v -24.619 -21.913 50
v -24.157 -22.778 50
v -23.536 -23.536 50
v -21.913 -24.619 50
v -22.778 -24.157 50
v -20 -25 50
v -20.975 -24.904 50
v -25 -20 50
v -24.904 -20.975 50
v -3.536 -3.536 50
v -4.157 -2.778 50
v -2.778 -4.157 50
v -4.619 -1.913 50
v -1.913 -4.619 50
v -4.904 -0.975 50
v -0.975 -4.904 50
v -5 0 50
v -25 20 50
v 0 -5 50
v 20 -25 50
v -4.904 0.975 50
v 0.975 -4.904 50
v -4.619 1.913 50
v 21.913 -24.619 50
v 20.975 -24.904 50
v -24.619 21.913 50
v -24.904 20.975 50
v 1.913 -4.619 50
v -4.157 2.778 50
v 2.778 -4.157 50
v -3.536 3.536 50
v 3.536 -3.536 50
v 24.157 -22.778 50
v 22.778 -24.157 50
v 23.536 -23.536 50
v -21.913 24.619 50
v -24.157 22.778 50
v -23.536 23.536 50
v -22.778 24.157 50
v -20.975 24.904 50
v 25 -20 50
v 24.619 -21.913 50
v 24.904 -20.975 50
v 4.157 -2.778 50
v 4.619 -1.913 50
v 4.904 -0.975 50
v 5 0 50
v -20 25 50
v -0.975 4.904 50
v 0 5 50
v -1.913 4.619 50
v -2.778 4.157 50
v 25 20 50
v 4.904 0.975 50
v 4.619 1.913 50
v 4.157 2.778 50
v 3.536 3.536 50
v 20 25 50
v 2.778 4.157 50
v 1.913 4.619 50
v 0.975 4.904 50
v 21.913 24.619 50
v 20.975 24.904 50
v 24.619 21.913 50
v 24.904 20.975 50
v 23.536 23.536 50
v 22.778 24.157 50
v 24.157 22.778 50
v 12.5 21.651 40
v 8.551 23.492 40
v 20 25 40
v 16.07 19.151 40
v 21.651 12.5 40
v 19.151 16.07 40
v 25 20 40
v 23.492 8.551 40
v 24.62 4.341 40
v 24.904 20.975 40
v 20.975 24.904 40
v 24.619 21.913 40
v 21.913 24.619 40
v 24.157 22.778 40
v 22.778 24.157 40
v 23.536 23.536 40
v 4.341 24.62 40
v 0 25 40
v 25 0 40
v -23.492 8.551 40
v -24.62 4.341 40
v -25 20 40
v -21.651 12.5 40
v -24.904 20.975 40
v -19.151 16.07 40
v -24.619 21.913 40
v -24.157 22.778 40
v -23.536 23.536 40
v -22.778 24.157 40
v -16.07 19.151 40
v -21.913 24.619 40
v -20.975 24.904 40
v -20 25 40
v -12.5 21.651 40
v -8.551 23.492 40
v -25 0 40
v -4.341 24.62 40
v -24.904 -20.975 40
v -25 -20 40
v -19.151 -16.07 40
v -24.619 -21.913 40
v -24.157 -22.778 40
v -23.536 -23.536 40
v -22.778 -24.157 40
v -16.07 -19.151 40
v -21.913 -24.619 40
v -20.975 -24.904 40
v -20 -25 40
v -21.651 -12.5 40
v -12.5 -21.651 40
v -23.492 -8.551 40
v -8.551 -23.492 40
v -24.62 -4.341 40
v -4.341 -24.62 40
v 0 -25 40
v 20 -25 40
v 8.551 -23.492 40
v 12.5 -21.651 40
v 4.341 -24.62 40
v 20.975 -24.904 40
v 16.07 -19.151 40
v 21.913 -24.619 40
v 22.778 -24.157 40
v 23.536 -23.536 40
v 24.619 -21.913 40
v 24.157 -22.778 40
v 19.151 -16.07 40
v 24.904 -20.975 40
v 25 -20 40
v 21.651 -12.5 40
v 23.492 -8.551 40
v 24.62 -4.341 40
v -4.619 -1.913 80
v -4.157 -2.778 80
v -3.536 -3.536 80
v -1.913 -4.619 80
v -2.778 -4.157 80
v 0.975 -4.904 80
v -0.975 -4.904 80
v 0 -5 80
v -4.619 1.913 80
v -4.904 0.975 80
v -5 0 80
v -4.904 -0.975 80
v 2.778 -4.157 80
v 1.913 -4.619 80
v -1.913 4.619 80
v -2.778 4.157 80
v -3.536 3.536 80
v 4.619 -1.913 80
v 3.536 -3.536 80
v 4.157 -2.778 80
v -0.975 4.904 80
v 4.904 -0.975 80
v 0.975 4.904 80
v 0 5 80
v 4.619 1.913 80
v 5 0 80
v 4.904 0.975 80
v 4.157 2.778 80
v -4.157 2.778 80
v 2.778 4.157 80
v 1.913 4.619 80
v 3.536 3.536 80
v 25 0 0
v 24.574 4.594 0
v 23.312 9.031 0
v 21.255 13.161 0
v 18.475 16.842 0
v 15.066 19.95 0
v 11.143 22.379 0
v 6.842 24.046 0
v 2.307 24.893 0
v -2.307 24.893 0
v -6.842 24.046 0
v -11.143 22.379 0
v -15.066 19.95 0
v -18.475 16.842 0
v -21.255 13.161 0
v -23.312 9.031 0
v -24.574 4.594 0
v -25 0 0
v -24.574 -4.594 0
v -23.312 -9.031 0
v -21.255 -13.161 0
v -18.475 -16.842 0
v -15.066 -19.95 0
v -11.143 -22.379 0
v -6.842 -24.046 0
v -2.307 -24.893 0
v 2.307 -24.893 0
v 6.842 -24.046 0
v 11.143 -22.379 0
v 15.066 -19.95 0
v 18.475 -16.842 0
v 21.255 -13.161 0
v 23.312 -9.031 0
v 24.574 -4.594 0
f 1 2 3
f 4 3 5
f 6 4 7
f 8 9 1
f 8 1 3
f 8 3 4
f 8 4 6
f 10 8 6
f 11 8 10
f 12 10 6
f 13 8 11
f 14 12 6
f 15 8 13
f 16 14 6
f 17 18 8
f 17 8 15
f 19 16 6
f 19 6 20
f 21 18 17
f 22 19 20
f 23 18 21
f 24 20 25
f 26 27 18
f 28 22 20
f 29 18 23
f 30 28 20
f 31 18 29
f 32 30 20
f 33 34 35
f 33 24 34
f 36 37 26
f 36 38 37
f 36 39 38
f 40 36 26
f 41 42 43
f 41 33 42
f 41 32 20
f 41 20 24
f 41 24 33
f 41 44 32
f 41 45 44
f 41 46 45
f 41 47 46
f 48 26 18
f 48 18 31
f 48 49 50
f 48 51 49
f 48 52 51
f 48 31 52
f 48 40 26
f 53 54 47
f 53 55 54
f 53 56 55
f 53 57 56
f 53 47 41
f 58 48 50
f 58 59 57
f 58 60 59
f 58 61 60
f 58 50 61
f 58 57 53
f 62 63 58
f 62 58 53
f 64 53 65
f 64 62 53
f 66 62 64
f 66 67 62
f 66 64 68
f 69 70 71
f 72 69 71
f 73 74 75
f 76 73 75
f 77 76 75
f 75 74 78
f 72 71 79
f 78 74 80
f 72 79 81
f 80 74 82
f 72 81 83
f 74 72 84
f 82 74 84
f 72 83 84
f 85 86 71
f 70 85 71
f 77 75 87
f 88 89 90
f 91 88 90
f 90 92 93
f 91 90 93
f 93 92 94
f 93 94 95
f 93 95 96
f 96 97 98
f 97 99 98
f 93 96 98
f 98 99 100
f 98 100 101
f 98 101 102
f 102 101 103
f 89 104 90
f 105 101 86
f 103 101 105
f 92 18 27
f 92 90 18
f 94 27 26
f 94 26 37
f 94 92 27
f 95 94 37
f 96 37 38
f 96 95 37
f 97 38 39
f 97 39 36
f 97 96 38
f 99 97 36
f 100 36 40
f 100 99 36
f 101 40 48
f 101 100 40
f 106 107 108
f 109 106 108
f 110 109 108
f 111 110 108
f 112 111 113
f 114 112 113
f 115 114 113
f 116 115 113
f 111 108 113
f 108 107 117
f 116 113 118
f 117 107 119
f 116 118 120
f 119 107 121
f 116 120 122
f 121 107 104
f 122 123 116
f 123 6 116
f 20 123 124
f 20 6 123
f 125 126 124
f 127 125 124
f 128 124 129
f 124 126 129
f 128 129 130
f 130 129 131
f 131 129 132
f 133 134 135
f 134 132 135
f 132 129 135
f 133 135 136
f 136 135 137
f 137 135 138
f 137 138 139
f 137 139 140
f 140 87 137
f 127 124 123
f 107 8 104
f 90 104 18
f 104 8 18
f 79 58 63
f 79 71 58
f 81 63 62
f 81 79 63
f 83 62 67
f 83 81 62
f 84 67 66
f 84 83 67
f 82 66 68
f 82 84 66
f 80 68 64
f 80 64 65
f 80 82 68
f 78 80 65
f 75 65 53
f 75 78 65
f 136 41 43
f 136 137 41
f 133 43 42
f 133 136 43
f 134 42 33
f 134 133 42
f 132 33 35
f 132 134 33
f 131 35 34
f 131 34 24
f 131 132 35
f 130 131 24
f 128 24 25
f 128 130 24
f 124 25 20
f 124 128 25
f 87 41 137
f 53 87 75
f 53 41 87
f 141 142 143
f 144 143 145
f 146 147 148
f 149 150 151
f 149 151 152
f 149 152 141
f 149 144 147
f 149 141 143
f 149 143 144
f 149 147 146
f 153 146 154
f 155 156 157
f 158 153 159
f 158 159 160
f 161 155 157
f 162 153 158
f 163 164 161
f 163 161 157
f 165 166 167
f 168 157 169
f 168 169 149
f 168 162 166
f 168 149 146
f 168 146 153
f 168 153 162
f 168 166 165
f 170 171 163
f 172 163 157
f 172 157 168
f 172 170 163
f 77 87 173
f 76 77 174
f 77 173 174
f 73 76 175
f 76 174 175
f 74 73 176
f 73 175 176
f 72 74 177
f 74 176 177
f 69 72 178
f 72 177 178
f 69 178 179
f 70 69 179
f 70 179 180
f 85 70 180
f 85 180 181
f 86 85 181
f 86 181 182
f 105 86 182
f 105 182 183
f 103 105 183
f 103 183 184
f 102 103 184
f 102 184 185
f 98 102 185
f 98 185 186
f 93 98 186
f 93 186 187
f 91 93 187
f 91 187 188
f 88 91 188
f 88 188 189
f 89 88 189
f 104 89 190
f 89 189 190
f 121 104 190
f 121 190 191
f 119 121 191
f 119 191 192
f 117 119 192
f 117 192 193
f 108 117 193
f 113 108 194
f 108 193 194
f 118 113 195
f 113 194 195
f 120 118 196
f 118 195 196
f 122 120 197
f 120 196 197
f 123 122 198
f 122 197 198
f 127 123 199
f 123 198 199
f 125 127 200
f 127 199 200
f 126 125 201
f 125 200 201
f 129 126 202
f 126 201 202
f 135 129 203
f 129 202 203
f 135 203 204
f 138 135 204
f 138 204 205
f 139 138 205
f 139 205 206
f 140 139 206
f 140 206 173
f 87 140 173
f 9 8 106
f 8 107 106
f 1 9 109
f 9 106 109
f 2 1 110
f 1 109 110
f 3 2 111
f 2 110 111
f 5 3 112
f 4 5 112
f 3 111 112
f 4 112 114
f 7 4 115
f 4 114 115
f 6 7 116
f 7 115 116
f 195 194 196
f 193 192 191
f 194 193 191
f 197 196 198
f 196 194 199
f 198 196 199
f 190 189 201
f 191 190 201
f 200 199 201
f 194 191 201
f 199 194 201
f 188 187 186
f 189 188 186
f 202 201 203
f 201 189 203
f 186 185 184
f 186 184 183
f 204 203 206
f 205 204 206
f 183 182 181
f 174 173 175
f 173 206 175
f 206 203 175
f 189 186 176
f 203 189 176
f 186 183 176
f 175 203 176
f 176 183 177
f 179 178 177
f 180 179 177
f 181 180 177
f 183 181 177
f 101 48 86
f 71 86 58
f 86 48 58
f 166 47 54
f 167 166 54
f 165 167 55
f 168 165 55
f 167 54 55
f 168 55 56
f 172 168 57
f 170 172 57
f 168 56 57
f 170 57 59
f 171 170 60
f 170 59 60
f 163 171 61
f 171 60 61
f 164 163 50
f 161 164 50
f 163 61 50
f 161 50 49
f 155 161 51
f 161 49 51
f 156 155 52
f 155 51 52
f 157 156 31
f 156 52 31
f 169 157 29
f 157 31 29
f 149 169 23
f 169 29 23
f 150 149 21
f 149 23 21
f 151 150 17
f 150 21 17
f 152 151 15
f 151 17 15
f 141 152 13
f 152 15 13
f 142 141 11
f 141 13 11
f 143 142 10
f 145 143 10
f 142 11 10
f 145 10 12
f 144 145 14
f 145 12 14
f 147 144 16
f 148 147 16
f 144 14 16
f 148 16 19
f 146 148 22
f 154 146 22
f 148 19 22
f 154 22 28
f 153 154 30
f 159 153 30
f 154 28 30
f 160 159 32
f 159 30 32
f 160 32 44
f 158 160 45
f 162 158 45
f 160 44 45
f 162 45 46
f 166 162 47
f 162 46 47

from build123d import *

# Parameters (mm, degrees)
SKETCH1_R           = 25
BOSS_EXTRUDE1_DEPTH = 50
SKETCH2_R           = 5
BOSS_EXTRUDE2_DEPTH = 30
SKETCH3_W           = 50
SKETCH3_H           = 50
BOSS_EXTRUDE3_DEPTH = 10
FILLET1_R           = 5


with BuildPart() as part:
    # Sketch1 → Boss-Extrude1 (new body)
    with BuildSketch(Plane.XY):
        Circle(SKETCH1_R)
    extrude(amount=BOSS_EXTRUDE1_DEPTH)

    # Sketch2 → Boss-Extrude2 (add)
    with BuildSketch(Plane.XY.offset(50)):
        Circle(SKETCH2_R)
    extrude(amount=BOSS_EXTRUDE2_DEPTH)

    # Sketch3 → Boss-Extrude3 (add)
    with BuildSketch(Plane.XY.offset(50)):
        Rectangle(SKETCH3_W, SKETCH3_H)
    extrude(amount=-BOSS_EXTRUDE3_DEPTH)

    # Fillet1
    fillet1_edges = [part.edges().sort_by_distance(p)[0] for p in [
        (25, 25, 45),
        (25, -25, 45),
        (-25, -25, 45),
        (-25, 25, 45),
    ]]
    fillet(fillet1_edges, radius=FILLET1_R)


solid = part.part
